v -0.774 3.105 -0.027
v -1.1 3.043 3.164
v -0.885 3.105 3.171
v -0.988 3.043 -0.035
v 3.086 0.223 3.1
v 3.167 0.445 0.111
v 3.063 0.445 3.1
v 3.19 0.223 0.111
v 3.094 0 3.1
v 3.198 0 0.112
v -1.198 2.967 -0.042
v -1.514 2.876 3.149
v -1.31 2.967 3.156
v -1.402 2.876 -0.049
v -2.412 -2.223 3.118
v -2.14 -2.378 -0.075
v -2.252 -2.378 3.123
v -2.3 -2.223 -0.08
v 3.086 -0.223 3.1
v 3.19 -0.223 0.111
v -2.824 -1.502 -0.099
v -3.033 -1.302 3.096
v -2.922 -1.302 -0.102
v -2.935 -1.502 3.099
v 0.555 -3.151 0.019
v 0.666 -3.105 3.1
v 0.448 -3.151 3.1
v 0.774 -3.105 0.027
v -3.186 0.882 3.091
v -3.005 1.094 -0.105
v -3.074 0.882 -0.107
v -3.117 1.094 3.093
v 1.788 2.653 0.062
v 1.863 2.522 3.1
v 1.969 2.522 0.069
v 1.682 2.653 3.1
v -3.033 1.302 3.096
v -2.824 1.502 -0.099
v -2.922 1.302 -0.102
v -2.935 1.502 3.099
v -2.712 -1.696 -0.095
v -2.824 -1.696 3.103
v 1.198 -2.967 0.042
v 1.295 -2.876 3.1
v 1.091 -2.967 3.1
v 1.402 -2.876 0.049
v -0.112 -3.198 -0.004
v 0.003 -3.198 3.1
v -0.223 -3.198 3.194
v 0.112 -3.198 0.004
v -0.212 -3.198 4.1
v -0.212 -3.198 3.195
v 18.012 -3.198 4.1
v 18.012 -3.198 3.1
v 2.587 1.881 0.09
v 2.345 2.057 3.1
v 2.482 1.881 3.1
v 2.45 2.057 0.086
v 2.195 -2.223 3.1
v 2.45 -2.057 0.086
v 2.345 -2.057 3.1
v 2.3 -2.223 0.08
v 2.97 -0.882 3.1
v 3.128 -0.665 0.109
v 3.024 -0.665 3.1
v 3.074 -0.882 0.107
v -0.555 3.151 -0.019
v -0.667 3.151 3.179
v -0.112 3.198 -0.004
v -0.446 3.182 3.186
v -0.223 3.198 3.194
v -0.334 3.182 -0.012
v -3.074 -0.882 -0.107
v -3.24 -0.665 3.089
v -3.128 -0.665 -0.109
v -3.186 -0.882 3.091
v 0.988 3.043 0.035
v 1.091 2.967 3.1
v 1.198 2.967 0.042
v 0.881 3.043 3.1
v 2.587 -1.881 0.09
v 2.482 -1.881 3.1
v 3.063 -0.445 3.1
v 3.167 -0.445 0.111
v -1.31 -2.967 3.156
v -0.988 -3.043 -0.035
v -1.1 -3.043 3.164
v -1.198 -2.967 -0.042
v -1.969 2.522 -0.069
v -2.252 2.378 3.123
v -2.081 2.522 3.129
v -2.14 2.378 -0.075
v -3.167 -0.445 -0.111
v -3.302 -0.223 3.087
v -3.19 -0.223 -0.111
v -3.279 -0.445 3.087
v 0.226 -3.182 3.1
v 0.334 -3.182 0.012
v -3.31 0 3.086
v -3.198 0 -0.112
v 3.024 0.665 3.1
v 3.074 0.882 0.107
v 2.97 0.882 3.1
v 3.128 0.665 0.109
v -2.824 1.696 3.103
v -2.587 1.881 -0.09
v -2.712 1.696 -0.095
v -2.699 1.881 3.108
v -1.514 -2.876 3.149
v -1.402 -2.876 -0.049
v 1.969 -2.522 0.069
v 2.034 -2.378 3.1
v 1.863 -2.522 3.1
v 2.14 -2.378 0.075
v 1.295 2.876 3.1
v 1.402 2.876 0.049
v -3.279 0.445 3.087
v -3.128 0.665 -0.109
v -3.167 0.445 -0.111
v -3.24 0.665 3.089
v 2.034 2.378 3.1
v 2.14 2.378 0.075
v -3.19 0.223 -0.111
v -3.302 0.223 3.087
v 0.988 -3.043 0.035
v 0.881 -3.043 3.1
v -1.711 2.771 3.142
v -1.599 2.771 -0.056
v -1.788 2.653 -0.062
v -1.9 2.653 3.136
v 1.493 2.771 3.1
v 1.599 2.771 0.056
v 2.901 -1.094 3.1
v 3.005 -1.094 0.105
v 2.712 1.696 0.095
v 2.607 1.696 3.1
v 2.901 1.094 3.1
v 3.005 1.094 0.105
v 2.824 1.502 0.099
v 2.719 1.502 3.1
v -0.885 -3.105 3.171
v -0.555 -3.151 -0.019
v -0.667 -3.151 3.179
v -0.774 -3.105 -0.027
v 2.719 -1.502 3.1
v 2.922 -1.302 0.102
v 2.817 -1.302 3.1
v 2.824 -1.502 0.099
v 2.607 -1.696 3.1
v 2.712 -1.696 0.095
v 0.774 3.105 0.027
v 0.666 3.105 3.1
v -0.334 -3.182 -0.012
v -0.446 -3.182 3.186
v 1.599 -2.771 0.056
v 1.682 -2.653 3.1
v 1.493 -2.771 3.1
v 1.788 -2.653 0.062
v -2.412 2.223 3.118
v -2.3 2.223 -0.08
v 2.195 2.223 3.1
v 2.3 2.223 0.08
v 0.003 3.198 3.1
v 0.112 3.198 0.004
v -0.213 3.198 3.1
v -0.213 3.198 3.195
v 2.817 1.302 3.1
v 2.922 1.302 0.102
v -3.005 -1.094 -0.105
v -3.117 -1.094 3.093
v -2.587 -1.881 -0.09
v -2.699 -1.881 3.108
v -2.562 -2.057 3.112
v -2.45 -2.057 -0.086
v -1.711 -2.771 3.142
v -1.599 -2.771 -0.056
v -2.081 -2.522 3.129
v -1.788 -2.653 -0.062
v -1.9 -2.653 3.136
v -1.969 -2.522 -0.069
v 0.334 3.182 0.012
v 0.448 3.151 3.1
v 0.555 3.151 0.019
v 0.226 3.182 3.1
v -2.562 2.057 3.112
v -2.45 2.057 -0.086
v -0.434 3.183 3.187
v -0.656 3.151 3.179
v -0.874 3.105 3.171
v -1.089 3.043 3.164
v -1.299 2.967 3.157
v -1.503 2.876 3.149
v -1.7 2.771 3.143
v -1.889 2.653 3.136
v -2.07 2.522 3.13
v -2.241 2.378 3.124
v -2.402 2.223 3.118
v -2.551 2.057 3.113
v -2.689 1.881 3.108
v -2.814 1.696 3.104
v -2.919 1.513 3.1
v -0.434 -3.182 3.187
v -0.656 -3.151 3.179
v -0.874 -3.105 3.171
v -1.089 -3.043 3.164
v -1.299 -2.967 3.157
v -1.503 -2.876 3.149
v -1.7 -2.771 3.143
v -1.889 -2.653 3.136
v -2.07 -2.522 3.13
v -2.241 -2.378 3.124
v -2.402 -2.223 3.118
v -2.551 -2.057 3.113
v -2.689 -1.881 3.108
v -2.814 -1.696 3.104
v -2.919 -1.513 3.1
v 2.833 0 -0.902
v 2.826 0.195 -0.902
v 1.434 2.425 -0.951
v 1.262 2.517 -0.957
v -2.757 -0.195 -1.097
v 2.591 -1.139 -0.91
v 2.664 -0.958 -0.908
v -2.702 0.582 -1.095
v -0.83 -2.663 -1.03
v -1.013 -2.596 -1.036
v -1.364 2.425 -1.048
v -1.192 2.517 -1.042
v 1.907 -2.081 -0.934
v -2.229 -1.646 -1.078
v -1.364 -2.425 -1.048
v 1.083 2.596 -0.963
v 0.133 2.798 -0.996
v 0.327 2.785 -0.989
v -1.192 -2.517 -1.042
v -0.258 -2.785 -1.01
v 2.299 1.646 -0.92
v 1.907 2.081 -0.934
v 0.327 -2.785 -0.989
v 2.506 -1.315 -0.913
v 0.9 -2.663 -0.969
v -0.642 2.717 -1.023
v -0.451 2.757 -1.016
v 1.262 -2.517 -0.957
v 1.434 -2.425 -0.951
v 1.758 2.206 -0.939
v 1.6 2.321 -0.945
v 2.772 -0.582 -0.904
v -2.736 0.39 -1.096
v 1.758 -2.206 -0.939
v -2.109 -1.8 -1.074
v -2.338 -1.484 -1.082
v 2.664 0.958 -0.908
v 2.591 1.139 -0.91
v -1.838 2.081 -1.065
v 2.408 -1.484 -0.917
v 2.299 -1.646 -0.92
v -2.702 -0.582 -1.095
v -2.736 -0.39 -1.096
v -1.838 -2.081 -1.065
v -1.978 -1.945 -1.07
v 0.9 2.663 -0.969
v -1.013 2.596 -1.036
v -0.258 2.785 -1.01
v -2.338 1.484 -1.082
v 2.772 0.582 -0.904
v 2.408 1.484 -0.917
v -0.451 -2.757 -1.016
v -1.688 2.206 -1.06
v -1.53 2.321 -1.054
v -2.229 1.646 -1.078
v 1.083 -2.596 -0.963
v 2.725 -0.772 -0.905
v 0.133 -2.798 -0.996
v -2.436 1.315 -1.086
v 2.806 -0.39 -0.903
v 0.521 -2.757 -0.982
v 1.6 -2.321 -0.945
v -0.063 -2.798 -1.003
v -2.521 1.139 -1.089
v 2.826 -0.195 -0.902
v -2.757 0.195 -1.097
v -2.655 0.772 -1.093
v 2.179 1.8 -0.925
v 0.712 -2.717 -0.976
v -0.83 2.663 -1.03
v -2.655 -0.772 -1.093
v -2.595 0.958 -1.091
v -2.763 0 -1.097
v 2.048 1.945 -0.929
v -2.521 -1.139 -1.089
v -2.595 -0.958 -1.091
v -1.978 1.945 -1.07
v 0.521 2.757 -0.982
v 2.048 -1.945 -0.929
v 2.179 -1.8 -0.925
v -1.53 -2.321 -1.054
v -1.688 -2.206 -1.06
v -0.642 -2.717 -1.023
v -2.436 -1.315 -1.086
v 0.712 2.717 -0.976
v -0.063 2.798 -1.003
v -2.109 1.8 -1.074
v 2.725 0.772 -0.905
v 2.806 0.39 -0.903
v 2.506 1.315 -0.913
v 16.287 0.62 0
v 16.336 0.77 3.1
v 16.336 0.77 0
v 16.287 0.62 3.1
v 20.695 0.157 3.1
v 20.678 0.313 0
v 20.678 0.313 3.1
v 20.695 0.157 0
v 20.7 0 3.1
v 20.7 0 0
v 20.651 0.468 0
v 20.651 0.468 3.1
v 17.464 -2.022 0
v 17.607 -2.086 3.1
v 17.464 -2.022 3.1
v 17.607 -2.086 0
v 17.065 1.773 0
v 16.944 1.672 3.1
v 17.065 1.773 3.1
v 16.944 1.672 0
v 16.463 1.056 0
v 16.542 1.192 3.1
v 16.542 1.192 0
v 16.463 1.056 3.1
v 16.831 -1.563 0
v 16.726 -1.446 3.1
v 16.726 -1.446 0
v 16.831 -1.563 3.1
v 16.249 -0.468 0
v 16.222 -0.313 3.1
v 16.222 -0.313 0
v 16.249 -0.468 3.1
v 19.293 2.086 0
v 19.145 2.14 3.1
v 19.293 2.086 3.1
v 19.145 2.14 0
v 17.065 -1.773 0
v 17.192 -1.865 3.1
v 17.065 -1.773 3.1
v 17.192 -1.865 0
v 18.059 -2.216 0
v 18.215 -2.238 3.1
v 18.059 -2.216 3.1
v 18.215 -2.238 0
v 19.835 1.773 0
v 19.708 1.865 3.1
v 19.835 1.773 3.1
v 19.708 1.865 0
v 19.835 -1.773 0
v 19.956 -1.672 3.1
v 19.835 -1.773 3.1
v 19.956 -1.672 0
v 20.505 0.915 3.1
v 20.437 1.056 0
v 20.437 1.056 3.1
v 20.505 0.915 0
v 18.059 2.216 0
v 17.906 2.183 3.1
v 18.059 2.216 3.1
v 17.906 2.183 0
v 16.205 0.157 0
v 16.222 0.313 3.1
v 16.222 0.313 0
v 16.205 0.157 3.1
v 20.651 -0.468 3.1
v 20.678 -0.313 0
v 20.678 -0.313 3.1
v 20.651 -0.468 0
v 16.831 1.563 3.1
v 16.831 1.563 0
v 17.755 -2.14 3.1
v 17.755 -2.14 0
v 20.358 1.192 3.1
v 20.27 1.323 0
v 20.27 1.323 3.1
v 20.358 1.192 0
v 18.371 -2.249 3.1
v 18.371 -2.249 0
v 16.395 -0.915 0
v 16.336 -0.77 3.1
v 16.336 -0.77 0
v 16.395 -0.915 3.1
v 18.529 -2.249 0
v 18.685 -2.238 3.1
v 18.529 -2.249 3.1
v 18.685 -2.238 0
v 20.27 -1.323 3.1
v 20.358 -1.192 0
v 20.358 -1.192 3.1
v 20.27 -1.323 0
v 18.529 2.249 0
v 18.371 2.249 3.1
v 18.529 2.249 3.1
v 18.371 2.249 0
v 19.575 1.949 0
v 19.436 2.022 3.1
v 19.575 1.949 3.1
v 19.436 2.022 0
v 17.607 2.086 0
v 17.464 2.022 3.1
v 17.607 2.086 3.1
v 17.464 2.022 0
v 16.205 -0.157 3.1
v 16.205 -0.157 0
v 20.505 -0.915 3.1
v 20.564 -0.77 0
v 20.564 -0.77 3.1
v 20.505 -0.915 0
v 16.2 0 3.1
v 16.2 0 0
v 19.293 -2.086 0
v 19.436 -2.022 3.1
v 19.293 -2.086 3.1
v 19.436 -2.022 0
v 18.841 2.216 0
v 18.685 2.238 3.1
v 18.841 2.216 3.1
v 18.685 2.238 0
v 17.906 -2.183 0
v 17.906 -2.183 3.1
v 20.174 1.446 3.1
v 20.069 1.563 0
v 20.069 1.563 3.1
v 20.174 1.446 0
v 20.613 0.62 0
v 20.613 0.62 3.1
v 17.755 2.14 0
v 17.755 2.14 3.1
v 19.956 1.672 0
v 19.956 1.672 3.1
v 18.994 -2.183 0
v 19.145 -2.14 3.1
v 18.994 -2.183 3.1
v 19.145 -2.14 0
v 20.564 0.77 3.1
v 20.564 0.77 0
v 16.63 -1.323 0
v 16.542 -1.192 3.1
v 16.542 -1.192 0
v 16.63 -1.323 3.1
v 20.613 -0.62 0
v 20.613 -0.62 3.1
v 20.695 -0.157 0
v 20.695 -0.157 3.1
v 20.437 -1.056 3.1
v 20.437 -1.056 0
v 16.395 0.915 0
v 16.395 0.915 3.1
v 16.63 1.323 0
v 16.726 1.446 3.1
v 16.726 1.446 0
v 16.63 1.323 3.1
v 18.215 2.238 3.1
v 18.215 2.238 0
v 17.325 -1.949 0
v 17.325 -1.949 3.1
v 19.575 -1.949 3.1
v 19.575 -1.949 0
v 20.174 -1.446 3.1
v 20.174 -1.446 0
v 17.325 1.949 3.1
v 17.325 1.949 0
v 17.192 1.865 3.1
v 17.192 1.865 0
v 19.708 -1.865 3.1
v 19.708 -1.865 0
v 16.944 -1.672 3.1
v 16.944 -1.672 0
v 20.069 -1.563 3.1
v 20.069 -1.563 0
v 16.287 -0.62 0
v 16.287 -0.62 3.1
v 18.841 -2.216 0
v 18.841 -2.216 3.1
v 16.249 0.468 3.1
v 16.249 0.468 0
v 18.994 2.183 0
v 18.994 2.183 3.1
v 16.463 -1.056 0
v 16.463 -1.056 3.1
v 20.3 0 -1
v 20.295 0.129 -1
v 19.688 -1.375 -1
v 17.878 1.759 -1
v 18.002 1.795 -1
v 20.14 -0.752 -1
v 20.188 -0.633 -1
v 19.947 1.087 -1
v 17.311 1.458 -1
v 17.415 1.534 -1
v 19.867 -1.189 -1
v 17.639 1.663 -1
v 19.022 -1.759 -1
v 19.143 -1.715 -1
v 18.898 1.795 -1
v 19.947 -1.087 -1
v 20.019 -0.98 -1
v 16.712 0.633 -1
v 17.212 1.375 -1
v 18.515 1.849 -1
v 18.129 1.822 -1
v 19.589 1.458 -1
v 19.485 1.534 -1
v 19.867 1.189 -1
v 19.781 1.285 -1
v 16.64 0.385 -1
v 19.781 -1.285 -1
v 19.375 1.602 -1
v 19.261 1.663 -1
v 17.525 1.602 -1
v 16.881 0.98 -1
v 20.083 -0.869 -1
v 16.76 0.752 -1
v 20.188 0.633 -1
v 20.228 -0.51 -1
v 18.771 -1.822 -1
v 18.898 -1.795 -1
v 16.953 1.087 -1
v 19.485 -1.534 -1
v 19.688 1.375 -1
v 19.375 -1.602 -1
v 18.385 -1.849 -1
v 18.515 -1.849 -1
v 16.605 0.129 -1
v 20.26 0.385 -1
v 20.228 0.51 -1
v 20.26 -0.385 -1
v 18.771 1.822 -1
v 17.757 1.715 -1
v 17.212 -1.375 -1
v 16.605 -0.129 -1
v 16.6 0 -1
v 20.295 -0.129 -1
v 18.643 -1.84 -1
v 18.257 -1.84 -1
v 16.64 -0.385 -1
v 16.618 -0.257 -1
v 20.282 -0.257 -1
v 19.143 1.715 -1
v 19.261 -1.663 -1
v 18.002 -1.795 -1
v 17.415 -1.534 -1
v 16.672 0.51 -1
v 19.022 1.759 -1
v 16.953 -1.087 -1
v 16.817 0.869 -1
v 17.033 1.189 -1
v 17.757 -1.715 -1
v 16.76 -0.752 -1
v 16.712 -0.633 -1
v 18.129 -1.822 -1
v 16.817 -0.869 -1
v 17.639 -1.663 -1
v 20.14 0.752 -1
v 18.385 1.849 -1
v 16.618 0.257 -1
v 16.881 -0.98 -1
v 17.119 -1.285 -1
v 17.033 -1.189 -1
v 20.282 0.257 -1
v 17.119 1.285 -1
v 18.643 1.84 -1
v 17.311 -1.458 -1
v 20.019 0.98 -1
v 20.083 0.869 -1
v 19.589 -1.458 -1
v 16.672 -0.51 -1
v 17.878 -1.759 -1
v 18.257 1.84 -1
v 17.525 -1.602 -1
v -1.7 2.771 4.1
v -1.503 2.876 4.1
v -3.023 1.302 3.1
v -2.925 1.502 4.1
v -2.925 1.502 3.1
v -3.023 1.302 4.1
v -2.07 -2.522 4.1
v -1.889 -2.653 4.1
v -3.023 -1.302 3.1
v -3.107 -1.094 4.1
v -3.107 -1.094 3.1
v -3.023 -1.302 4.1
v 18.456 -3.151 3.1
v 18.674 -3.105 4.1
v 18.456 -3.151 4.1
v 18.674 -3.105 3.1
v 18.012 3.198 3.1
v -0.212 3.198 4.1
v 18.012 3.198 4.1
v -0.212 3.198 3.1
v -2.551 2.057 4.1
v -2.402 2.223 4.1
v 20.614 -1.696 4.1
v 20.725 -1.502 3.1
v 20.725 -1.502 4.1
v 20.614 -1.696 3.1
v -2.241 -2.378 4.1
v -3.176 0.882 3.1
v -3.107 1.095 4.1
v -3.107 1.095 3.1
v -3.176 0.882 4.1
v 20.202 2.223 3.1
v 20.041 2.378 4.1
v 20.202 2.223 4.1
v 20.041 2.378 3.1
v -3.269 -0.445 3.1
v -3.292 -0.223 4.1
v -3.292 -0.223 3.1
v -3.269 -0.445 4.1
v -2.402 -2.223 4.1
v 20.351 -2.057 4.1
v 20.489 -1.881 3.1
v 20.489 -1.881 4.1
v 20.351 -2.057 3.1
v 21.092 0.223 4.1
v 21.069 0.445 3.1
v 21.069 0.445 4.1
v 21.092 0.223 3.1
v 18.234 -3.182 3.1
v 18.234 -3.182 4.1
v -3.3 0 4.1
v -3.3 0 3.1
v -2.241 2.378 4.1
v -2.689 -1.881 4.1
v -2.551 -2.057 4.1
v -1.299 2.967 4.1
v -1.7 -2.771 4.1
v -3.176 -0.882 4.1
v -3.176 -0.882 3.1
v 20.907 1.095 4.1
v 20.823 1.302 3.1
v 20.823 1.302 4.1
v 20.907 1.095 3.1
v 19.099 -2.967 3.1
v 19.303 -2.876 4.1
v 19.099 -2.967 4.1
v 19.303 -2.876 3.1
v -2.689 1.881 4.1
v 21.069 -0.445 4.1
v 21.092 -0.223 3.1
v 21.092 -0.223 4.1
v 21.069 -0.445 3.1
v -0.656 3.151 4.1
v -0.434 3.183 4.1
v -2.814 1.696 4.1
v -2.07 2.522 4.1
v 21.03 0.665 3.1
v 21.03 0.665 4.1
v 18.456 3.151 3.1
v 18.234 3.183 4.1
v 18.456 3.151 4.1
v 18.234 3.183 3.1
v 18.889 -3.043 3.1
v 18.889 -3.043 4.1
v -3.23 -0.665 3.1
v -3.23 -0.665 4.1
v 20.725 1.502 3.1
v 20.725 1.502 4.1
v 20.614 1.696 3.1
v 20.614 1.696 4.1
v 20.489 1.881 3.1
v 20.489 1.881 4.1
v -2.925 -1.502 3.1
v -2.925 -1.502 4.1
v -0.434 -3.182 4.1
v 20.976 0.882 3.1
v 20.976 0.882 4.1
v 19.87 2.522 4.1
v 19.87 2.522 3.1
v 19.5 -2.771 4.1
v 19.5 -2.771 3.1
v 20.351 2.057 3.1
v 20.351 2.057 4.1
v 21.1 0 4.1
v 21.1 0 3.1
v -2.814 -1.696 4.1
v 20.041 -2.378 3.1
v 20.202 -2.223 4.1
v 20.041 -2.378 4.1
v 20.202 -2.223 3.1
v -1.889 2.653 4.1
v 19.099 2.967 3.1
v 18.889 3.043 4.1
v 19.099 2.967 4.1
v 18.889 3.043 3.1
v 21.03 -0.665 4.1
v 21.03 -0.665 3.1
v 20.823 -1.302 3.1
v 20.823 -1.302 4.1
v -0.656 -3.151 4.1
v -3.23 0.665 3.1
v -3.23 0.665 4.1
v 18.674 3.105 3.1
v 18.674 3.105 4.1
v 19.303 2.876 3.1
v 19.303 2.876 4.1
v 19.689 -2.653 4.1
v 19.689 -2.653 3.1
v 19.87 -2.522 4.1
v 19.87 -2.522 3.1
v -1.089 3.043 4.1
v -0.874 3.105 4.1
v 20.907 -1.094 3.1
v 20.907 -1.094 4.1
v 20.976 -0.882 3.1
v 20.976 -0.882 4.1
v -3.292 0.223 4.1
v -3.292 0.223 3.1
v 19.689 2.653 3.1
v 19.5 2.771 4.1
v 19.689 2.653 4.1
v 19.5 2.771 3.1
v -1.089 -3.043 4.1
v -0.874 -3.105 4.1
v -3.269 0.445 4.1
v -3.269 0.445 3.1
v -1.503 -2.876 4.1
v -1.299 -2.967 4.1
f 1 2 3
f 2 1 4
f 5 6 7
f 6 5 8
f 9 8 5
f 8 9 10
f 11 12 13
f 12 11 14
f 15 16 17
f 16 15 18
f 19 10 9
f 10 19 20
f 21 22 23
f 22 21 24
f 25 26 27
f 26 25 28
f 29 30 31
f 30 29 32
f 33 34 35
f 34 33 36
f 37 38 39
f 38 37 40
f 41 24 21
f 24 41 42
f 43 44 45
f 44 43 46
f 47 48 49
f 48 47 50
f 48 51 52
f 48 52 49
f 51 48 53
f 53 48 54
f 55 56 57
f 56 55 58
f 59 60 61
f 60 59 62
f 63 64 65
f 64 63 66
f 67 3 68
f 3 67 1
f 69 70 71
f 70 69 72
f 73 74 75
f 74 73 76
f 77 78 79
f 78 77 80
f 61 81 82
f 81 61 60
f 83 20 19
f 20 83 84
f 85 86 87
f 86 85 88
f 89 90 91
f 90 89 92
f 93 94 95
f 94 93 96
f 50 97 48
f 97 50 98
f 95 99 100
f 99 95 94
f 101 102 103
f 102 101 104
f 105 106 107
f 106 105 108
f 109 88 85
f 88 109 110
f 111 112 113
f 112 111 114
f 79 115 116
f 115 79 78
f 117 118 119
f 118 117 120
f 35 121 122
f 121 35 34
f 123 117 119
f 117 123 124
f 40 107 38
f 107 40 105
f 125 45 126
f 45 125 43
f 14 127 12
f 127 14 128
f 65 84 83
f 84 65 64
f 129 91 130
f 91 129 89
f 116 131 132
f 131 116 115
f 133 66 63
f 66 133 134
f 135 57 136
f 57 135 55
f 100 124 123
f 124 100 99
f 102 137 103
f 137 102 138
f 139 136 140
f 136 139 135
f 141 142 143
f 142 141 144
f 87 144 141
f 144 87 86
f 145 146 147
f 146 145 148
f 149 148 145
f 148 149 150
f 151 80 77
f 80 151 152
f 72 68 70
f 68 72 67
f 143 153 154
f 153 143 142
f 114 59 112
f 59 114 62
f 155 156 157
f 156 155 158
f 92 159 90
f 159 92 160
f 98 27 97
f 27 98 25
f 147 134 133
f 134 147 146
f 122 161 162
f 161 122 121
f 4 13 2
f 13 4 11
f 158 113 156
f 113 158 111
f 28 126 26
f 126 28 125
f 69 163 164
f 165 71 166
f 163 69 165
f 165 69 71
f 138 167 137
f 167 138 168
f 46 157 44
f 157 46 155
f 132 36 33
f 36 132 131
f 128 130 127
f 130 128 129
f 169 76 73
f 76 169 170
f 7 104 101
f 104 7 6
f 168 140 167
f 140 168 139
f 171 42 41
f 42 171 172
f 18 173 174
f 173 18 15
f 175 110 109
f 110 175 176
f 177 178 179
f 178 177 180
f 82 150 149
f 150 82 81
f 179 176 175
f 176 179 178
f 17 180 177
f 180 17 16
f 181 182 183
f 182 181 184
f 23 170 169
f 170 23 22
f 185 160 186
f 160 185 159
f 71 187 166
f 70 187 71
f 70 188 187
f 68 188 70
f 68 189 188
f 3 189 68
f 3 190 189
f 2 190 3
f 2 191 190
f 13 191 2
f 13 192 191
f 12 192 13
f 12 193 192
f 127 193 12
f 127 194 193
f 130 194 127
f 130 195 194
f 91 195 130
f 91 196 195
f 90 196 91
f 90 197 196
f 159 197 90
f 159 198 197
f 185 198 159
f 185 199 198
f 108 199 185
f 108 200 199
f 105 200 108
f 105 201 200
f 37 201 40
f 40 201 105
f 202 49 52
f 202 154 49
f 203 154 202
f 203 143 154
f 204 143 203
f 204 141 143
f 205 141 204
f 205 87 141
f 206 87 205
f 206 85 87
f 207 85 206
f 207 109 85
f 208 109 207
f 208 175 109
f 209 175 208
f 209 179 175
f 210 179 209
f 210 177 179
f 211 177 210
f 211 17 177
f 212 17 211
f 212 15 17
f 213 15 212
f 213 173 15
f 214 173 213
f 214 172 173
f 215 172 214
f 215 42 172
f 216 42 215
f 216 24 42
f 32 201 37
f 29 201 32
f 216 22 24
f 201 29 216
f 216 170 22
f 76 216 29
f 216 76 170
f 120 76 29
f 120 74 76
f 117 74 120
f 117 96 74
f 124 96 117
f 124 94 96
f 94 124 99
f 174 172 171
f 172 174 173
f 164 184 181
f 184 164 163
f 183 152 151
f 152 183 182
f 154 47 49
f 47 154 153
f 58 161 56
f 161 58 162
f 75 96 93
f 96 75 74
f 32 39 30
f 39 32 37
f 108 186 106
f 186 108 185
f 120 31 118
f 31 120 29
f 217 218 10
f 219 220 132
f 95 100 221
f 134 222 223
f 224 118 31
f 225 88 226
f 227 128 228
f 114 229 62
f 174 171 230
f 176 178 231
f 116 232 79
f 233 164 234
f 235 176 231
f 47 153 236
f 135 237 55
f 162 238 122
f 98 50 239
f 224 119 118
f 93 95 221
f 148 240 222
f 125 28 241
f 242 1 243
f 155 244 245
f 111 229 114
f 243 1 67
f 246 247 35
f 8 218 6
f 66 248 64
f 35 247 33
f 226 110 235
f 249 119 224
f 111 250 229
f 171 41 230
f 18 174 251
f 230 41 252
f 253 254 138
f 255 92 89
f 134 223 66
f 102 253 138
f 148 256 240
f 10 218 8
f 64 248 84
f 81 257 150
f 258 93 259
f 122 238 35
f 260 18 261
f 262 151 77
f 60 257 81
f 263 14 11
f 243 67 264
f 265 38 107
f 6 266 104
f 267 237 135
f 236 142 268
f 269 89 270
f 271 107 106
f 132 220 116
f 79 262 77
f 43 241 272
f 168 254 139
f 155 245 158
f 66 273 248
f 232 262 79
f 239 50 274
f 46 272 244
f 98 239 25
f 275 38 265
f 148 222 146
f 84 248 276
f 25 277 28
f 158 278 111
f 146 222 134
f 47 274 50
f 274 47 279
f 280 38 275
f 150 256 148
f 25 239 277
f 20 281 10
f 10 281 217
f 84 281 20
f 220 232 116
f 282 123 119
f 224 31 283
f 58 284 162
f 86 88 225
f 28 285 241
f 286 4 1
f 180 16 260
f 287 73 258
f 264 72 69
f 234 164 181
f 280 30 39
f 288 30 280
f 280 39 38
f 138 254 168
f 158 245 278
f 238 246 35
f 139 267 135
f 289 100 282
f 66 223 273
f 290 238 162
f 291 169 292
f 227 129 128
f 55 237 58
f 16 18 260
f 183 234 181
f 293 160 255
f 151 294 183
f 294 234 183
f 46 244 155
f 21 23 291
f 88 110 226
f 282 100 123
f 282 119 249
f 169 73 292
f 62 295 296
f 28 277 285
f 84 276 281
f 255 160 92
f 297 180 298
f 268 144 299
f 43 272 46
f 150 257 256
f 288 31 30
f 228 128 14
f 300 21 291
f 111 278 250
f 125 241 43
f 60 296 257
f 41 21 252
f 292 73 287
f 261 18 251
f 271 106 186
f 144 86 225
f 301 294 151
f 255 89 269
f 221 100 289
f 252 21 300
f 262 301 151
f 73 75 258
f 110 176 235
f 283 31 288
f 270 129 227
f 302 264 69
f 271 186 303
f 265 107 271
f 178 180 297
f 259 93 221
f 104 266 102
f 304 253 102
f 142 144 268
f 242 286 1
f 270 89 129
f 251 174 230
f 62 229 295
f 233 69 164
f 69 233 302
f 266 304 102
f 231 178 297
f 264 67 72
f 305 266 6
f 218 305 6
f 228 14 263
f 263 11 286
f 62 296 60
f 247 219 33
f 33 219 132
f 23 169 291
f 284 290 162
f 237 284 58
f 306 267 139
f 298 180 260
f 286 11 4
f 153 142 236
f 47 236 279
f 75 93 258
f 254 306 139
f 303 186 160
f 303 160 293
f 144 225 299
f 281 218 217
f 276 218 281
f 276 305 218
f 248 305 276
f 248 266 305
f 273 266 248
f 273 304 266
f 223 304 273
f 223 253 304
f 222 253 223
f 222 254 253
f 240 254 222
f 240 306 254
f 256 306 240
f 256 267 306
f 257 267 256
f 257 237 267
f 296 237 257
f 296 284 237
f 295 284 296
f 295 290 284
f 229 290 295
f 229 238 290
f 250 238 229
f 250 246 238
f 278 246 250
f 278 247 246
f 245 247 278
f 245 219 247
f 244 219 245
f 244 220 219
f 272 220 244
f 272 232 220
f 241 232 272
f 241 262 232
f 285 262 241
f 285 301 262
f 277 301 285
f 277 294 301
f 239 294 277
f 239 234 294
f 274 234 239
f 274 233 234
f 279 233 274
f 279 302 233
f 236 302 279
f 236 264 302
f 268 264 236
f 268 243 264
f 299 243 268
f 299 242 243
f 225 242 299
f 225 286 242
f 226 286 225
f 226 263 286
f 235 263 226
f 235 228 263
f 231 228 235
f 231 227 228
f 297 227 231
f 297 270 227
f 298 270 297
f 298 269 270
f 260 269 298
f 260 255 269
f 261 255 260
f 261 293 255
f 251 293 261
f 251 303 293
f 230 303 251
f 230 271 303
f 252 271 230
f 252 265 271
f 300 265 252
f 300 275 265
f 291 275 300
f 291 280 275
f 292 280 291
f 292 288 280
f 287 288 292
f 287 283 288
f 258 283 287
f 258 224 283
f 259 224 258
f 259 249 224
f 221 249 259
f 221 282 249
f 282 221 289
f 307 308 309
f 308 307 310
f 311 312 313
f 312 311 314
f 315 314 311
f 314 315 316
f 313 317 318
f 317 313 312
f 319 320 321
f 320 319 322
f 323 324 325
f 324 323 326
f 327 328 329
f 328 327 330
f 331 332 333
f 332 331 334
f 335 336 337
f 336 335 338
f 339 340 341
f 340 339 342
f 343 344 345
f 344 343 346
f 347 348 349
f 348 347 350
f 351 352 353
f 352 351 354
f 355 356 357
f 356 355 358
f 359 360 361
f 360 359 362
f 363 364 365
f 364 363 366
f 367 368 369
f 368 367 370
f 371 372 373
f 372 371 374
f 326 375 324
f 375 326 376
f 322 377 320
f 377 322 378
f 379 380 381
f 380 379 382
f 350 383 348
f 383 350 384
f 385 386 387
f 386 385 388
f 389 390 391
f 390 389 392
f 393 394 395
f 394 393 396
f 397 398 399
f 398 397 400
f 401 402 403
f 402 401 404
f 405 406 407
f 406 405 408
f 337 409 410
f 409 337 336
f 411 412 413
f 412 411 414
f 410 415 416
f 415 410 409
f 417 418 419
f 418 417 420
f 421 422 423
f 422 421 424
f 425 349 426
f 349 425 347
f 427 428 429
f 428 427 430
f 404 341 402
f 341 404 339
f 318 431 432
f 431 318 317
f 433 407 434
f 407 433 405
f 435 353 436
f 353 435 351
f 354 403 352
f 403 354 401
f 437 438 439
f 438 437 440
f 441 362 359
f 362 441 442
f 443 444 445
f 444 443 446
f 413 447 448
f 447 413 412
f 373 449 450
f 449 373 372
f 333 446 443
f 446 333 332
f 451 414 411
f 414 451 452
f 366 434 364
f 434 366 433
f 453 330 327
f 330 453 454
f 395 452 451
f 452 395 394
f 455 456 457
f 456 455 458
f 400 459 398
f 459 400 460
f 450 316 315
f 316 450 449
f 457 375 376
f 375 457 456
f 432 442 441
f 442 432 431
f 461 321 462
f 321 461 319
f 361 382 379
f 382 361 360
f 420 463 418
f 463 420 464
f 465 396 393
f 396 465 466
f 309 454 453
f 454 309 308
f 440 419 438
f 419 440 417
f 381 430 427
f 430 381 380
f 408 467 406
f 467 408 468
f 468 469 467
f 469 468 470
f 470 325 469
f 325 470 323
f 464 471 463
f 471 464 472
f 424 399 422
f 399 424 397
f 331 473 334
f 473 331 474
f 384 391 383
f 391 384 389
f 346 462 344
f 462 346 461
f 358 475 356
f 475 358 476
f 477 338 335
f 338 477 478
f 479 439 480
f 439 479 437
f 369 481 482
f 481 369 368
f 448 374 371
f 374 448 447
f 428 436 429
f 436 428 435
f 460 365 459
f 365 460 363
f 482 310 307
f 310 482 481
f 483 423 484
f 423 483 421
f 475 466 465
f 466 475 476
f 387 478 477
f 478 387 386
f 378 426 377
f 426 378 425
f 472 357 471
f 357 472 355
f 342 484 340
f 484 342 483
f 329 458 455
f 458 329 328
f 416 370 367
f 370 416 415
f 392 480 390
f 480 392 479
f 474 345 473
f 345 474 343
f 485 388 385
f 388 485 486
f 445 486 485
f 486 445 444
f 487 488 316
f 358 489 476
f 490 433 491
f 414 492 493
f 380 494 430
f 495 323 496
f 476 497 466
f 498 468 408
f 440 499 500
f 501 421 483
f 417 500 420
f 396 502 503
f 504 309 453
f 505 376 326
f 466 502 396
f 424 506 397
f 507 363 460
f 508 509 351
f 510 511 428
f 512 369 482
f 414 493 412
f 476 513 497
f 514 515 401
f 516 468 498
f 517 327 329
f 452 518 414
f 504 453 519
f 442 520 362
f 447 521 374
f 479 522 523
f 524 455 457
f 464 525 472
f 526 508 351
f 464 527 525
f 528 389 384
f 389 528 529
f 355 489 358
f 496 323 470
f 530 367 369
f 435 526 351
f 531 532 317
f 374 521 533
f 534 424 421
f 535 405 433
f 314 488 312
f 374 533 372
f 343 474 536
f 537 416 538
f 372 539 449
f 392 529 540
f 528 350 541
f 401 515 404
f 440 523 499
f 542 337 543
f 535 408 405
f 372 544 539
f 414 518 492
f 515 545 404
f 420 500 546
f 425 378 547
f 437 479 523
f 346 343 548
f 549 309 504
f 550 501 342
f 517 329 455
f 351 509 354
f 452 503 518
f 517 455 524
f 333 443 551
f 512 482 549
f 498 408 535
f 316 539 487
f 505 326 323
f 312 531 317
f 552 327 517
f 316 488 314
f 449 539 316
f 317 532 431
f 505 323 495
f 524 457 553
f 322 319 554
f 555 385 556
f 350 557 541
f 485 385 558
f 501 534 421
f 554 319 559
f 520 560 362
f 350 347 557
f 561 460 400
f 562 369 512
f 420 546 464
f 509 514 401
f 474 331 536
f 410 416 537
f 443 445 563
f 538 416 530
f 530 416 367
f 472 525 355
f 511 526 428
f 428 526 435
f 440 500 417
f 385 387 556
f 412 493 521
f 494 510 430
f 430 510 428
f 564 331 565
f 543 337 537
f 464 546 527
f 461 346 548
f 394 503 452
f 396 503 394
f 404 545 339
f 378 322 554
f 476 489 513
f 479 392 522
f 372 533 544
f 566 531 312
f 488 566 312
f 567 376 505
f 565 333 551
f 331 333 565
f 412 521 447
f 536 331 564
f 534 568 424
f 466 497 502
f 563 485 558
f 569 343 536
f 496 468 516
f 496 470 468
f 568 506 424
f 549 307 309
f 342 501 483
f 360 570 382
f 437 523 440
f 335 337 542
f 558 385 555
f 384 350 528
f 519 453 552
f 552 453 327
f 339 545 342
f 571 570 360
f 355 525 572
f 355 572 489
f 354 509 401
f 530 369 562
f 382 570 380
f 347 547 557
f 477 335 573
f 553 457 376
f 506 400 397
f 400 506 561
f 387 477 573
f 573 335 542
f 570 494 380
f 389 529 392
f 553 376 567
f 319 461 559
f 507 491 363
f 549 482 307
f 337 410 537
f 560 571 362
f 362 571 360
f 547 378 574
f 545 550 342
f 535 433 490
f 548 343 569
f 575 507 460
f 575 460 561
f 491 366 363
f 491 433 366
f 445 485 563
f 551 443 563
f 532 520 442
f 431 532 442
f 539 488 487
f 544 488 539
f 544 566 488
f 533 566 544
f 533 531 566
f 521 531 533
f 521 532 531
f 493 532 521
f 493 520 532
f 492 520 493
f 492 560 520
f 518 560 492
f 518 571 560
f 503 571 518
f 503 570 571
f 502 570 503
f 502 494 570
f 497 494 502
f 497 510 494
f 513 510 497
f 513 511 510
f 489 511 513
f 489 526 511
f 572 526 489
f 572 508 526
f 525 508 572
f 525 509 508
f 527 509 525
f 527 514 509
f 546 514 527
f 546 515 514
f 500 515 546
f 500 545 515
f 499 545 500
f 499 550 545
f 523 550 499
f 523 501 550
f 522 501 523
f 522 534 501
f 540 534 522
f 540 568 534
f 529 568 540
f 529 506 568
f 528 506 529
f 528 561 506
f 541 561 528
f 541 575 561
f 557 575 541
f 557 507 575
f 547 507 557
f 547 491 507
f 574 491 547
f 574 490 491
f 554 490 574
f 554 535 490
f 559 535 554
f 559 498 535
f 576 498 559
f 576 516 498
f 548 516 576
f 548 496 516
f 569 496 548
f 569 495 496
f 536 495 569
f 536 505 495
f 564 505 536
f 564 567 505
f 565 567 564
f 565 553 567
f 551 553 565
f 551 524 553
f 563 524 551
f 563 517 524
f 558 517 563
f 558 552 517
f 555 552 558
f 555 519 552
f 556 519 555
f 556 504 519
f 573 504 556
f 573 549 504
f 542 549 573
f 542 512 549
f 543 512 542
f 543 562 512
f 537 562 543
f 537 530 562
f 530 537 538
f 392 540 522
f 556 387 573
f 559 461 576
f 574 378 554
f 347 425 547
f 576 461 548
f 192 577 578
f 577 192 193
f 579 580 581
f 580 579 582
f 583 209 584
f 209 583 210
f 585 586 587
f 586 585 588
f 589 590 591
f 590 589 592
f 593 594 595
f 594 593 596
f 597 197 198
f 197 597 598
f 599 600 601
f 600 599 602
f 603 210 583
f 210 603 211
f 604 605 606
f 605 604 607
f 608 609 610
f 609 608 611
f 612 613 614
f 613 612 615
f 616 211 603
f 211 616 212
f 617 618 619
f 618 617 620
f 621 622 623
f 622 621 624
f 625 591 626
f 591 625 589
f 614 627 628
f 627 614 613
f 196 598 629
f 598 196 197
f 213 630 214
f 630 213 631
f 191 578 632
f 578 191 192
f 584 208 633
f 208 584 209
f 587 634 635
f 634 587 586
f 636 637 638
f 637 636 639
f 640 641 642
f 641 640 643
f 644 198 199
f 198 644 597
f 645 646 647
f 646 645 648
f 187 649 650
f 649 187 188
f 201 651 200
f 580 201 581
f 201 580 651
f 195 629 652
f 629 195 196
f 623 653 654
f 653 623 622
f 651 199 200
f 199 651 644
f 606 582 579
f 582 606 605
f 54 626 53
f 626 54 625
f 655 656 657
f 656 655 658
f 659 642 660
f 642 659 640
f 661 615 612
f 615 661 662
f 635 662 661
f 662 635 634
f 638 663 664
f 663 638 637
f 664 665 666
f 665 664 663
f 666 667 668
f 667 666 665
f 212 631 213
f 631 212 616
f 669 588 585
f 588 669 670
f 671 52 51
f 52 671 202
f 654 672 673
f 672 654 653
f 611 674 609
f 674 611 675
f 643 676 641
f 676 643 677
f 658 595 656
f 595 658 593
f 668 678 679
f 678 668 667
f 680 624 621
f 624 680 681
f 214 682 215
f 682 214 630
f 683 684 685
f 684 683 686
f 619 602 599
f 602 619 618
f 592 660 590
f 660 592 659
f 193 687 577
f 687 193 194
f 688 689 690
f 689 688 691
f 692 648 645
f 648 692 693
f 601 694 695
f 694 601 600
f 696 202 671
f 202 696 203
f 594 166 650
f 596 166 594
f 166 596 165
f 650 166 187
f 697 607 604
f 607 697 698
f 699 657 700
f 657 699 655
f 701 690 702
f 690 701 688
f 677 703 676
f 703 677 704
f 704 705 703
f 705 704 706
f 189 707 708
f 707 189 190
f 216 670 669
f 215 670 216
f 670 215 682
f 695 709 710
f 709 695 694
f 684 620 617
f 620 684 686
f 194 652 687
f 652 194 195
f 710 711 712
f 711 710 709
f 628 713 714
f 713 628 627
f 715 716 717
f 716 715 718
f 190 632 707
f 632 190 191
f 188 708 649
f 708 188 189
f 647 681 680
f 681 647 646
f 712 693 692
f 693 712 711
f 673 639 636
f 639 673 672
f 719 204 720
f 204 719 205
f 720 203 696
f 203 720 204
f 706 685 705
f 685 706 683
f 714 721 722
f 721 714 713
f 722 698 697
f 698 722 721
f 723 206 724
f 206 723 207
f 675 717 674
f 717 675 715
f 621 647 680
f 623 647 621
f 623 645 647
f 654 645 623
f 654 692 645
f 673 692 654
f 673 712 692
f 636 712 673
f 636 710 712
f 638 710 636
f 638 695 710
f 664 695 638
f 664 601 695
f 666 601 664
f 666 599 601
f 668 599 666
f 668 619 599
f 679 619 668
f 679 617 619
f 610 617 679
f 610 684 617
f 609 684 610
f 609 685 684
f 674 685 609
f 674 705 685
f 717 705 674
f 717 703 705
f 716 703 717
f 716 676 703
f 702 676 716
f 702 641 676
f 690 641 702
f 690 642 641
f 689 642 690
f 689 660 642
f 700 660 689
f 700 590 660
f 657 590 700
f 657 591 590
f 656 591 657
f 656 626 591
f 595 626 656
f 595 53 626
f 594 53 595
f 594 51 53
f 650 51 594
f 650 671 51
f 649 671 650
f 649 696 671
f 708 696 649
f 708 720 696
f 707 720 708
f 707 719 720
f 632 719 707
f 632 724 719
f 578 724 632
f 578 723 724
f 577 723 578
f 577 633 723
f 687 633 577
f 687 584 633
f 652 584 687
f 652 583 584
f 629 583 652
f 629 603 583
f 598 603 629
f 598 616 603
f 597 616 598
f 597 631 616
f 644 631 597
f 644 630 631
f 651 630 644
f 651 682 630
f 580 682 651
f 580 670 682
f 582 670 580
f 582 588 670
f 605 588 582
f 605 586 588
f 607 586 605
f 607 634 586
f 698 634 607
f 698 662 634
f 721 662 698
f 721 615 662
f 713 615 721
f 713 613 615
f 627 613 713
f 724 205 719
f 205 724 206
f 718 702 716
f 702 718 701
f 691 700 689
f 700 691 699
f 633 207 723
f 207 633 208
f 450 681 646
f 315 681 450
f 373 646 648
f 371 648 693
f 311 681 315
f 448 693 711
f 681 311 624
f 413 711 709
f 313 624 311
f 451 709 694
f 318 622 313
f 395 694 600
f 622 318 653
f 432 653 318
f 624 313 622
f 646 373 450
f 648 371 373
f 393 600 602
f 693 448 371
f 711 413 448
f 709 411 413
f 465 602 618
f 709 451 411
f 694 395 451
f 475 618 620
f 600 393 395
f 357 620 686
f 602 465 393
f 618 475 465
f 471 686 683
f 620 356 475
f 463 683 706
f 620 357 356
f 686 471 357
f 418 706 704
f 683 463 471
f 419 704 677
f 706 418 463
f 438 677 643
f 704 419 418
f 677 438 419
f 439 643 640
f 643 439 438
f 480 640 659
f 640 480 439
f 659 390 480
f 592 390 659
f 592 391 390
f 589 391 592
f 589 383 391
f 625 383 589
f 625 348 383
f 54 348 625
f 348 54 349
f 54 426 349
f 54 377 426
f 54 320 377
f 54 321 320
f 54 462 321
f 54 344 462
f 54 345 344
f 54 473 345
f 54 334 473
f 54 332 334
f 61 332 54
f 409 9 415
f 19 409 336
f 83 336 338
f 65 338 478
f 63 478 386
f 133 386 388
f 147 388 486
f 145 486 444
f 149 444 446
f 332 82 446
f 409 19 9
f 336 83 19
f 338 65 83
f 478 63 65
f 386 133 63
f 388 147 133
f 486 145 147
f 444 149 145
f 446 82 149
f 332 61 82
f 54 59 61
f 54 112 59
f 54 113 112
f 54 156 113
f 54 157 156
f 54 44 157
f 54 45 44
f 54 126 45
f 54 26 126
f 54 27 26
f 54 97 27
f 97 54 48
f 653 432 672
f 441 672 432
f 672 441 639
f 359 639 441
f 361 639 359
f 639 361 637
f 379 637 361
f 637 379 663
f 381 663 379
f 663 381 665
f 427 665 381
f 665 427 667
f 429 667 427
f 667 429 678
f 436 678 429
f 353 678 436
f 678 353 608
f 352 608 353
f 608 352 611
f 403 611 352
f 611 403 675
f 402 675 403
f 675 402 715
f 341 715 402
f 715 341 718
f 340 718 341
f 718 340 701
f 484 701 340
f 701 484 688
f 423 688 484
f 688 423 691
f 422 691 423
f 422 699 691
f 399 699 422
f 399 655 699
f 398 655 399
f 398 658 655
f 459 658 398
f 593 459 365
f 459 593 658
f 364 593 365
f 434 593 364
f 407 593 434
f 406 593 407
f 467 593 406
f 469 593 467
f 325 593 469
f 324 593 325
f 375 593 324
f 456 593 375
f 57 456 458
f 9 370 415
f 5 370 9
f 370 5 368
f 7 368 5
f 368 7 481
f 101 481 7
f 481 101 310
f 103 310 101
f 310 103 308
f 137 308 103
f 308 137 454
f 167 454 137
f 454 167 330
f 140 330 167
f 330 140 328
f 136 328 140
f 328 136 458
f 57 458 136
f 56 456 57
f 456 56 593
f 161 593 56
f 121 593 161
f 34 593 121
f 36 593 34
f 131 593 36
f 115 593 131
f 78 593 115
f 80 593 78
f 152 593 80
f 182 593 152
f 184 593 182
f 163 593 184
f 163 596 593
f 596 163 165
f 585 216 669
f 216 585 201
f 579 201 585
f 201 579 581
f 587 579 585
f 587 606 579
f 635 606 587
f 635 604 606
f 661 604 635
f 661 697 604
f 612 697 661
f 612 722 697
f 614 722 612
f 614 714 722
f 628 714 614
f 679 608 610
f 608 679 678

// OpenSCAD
$fn = 90;

d1 = 6.4;
d2 = 4.5;
height = 3.2;
distance = 13;
angle = 2;

bolts();
top();

module bolts() {
    rotate([0, -angle, 0]) bolt(d1);
    translate([d1 / 2 + d2 / 2 + distance, 0, 0]) bolt(d2);
}

module bolt(diameter) {
    cylinder(d = diameter, h = height);
    translate([0, 0, -1]) cylinder(d1 = diameter - 0.8, d2 = diameter, h = 1);
}

module top() {
    translate([-0.1, 0, 3.1]) minkowski() {
        cube([18, 0.0001, 1]);
        cylinder(d = d1, h = 0.0001);
    }
}
